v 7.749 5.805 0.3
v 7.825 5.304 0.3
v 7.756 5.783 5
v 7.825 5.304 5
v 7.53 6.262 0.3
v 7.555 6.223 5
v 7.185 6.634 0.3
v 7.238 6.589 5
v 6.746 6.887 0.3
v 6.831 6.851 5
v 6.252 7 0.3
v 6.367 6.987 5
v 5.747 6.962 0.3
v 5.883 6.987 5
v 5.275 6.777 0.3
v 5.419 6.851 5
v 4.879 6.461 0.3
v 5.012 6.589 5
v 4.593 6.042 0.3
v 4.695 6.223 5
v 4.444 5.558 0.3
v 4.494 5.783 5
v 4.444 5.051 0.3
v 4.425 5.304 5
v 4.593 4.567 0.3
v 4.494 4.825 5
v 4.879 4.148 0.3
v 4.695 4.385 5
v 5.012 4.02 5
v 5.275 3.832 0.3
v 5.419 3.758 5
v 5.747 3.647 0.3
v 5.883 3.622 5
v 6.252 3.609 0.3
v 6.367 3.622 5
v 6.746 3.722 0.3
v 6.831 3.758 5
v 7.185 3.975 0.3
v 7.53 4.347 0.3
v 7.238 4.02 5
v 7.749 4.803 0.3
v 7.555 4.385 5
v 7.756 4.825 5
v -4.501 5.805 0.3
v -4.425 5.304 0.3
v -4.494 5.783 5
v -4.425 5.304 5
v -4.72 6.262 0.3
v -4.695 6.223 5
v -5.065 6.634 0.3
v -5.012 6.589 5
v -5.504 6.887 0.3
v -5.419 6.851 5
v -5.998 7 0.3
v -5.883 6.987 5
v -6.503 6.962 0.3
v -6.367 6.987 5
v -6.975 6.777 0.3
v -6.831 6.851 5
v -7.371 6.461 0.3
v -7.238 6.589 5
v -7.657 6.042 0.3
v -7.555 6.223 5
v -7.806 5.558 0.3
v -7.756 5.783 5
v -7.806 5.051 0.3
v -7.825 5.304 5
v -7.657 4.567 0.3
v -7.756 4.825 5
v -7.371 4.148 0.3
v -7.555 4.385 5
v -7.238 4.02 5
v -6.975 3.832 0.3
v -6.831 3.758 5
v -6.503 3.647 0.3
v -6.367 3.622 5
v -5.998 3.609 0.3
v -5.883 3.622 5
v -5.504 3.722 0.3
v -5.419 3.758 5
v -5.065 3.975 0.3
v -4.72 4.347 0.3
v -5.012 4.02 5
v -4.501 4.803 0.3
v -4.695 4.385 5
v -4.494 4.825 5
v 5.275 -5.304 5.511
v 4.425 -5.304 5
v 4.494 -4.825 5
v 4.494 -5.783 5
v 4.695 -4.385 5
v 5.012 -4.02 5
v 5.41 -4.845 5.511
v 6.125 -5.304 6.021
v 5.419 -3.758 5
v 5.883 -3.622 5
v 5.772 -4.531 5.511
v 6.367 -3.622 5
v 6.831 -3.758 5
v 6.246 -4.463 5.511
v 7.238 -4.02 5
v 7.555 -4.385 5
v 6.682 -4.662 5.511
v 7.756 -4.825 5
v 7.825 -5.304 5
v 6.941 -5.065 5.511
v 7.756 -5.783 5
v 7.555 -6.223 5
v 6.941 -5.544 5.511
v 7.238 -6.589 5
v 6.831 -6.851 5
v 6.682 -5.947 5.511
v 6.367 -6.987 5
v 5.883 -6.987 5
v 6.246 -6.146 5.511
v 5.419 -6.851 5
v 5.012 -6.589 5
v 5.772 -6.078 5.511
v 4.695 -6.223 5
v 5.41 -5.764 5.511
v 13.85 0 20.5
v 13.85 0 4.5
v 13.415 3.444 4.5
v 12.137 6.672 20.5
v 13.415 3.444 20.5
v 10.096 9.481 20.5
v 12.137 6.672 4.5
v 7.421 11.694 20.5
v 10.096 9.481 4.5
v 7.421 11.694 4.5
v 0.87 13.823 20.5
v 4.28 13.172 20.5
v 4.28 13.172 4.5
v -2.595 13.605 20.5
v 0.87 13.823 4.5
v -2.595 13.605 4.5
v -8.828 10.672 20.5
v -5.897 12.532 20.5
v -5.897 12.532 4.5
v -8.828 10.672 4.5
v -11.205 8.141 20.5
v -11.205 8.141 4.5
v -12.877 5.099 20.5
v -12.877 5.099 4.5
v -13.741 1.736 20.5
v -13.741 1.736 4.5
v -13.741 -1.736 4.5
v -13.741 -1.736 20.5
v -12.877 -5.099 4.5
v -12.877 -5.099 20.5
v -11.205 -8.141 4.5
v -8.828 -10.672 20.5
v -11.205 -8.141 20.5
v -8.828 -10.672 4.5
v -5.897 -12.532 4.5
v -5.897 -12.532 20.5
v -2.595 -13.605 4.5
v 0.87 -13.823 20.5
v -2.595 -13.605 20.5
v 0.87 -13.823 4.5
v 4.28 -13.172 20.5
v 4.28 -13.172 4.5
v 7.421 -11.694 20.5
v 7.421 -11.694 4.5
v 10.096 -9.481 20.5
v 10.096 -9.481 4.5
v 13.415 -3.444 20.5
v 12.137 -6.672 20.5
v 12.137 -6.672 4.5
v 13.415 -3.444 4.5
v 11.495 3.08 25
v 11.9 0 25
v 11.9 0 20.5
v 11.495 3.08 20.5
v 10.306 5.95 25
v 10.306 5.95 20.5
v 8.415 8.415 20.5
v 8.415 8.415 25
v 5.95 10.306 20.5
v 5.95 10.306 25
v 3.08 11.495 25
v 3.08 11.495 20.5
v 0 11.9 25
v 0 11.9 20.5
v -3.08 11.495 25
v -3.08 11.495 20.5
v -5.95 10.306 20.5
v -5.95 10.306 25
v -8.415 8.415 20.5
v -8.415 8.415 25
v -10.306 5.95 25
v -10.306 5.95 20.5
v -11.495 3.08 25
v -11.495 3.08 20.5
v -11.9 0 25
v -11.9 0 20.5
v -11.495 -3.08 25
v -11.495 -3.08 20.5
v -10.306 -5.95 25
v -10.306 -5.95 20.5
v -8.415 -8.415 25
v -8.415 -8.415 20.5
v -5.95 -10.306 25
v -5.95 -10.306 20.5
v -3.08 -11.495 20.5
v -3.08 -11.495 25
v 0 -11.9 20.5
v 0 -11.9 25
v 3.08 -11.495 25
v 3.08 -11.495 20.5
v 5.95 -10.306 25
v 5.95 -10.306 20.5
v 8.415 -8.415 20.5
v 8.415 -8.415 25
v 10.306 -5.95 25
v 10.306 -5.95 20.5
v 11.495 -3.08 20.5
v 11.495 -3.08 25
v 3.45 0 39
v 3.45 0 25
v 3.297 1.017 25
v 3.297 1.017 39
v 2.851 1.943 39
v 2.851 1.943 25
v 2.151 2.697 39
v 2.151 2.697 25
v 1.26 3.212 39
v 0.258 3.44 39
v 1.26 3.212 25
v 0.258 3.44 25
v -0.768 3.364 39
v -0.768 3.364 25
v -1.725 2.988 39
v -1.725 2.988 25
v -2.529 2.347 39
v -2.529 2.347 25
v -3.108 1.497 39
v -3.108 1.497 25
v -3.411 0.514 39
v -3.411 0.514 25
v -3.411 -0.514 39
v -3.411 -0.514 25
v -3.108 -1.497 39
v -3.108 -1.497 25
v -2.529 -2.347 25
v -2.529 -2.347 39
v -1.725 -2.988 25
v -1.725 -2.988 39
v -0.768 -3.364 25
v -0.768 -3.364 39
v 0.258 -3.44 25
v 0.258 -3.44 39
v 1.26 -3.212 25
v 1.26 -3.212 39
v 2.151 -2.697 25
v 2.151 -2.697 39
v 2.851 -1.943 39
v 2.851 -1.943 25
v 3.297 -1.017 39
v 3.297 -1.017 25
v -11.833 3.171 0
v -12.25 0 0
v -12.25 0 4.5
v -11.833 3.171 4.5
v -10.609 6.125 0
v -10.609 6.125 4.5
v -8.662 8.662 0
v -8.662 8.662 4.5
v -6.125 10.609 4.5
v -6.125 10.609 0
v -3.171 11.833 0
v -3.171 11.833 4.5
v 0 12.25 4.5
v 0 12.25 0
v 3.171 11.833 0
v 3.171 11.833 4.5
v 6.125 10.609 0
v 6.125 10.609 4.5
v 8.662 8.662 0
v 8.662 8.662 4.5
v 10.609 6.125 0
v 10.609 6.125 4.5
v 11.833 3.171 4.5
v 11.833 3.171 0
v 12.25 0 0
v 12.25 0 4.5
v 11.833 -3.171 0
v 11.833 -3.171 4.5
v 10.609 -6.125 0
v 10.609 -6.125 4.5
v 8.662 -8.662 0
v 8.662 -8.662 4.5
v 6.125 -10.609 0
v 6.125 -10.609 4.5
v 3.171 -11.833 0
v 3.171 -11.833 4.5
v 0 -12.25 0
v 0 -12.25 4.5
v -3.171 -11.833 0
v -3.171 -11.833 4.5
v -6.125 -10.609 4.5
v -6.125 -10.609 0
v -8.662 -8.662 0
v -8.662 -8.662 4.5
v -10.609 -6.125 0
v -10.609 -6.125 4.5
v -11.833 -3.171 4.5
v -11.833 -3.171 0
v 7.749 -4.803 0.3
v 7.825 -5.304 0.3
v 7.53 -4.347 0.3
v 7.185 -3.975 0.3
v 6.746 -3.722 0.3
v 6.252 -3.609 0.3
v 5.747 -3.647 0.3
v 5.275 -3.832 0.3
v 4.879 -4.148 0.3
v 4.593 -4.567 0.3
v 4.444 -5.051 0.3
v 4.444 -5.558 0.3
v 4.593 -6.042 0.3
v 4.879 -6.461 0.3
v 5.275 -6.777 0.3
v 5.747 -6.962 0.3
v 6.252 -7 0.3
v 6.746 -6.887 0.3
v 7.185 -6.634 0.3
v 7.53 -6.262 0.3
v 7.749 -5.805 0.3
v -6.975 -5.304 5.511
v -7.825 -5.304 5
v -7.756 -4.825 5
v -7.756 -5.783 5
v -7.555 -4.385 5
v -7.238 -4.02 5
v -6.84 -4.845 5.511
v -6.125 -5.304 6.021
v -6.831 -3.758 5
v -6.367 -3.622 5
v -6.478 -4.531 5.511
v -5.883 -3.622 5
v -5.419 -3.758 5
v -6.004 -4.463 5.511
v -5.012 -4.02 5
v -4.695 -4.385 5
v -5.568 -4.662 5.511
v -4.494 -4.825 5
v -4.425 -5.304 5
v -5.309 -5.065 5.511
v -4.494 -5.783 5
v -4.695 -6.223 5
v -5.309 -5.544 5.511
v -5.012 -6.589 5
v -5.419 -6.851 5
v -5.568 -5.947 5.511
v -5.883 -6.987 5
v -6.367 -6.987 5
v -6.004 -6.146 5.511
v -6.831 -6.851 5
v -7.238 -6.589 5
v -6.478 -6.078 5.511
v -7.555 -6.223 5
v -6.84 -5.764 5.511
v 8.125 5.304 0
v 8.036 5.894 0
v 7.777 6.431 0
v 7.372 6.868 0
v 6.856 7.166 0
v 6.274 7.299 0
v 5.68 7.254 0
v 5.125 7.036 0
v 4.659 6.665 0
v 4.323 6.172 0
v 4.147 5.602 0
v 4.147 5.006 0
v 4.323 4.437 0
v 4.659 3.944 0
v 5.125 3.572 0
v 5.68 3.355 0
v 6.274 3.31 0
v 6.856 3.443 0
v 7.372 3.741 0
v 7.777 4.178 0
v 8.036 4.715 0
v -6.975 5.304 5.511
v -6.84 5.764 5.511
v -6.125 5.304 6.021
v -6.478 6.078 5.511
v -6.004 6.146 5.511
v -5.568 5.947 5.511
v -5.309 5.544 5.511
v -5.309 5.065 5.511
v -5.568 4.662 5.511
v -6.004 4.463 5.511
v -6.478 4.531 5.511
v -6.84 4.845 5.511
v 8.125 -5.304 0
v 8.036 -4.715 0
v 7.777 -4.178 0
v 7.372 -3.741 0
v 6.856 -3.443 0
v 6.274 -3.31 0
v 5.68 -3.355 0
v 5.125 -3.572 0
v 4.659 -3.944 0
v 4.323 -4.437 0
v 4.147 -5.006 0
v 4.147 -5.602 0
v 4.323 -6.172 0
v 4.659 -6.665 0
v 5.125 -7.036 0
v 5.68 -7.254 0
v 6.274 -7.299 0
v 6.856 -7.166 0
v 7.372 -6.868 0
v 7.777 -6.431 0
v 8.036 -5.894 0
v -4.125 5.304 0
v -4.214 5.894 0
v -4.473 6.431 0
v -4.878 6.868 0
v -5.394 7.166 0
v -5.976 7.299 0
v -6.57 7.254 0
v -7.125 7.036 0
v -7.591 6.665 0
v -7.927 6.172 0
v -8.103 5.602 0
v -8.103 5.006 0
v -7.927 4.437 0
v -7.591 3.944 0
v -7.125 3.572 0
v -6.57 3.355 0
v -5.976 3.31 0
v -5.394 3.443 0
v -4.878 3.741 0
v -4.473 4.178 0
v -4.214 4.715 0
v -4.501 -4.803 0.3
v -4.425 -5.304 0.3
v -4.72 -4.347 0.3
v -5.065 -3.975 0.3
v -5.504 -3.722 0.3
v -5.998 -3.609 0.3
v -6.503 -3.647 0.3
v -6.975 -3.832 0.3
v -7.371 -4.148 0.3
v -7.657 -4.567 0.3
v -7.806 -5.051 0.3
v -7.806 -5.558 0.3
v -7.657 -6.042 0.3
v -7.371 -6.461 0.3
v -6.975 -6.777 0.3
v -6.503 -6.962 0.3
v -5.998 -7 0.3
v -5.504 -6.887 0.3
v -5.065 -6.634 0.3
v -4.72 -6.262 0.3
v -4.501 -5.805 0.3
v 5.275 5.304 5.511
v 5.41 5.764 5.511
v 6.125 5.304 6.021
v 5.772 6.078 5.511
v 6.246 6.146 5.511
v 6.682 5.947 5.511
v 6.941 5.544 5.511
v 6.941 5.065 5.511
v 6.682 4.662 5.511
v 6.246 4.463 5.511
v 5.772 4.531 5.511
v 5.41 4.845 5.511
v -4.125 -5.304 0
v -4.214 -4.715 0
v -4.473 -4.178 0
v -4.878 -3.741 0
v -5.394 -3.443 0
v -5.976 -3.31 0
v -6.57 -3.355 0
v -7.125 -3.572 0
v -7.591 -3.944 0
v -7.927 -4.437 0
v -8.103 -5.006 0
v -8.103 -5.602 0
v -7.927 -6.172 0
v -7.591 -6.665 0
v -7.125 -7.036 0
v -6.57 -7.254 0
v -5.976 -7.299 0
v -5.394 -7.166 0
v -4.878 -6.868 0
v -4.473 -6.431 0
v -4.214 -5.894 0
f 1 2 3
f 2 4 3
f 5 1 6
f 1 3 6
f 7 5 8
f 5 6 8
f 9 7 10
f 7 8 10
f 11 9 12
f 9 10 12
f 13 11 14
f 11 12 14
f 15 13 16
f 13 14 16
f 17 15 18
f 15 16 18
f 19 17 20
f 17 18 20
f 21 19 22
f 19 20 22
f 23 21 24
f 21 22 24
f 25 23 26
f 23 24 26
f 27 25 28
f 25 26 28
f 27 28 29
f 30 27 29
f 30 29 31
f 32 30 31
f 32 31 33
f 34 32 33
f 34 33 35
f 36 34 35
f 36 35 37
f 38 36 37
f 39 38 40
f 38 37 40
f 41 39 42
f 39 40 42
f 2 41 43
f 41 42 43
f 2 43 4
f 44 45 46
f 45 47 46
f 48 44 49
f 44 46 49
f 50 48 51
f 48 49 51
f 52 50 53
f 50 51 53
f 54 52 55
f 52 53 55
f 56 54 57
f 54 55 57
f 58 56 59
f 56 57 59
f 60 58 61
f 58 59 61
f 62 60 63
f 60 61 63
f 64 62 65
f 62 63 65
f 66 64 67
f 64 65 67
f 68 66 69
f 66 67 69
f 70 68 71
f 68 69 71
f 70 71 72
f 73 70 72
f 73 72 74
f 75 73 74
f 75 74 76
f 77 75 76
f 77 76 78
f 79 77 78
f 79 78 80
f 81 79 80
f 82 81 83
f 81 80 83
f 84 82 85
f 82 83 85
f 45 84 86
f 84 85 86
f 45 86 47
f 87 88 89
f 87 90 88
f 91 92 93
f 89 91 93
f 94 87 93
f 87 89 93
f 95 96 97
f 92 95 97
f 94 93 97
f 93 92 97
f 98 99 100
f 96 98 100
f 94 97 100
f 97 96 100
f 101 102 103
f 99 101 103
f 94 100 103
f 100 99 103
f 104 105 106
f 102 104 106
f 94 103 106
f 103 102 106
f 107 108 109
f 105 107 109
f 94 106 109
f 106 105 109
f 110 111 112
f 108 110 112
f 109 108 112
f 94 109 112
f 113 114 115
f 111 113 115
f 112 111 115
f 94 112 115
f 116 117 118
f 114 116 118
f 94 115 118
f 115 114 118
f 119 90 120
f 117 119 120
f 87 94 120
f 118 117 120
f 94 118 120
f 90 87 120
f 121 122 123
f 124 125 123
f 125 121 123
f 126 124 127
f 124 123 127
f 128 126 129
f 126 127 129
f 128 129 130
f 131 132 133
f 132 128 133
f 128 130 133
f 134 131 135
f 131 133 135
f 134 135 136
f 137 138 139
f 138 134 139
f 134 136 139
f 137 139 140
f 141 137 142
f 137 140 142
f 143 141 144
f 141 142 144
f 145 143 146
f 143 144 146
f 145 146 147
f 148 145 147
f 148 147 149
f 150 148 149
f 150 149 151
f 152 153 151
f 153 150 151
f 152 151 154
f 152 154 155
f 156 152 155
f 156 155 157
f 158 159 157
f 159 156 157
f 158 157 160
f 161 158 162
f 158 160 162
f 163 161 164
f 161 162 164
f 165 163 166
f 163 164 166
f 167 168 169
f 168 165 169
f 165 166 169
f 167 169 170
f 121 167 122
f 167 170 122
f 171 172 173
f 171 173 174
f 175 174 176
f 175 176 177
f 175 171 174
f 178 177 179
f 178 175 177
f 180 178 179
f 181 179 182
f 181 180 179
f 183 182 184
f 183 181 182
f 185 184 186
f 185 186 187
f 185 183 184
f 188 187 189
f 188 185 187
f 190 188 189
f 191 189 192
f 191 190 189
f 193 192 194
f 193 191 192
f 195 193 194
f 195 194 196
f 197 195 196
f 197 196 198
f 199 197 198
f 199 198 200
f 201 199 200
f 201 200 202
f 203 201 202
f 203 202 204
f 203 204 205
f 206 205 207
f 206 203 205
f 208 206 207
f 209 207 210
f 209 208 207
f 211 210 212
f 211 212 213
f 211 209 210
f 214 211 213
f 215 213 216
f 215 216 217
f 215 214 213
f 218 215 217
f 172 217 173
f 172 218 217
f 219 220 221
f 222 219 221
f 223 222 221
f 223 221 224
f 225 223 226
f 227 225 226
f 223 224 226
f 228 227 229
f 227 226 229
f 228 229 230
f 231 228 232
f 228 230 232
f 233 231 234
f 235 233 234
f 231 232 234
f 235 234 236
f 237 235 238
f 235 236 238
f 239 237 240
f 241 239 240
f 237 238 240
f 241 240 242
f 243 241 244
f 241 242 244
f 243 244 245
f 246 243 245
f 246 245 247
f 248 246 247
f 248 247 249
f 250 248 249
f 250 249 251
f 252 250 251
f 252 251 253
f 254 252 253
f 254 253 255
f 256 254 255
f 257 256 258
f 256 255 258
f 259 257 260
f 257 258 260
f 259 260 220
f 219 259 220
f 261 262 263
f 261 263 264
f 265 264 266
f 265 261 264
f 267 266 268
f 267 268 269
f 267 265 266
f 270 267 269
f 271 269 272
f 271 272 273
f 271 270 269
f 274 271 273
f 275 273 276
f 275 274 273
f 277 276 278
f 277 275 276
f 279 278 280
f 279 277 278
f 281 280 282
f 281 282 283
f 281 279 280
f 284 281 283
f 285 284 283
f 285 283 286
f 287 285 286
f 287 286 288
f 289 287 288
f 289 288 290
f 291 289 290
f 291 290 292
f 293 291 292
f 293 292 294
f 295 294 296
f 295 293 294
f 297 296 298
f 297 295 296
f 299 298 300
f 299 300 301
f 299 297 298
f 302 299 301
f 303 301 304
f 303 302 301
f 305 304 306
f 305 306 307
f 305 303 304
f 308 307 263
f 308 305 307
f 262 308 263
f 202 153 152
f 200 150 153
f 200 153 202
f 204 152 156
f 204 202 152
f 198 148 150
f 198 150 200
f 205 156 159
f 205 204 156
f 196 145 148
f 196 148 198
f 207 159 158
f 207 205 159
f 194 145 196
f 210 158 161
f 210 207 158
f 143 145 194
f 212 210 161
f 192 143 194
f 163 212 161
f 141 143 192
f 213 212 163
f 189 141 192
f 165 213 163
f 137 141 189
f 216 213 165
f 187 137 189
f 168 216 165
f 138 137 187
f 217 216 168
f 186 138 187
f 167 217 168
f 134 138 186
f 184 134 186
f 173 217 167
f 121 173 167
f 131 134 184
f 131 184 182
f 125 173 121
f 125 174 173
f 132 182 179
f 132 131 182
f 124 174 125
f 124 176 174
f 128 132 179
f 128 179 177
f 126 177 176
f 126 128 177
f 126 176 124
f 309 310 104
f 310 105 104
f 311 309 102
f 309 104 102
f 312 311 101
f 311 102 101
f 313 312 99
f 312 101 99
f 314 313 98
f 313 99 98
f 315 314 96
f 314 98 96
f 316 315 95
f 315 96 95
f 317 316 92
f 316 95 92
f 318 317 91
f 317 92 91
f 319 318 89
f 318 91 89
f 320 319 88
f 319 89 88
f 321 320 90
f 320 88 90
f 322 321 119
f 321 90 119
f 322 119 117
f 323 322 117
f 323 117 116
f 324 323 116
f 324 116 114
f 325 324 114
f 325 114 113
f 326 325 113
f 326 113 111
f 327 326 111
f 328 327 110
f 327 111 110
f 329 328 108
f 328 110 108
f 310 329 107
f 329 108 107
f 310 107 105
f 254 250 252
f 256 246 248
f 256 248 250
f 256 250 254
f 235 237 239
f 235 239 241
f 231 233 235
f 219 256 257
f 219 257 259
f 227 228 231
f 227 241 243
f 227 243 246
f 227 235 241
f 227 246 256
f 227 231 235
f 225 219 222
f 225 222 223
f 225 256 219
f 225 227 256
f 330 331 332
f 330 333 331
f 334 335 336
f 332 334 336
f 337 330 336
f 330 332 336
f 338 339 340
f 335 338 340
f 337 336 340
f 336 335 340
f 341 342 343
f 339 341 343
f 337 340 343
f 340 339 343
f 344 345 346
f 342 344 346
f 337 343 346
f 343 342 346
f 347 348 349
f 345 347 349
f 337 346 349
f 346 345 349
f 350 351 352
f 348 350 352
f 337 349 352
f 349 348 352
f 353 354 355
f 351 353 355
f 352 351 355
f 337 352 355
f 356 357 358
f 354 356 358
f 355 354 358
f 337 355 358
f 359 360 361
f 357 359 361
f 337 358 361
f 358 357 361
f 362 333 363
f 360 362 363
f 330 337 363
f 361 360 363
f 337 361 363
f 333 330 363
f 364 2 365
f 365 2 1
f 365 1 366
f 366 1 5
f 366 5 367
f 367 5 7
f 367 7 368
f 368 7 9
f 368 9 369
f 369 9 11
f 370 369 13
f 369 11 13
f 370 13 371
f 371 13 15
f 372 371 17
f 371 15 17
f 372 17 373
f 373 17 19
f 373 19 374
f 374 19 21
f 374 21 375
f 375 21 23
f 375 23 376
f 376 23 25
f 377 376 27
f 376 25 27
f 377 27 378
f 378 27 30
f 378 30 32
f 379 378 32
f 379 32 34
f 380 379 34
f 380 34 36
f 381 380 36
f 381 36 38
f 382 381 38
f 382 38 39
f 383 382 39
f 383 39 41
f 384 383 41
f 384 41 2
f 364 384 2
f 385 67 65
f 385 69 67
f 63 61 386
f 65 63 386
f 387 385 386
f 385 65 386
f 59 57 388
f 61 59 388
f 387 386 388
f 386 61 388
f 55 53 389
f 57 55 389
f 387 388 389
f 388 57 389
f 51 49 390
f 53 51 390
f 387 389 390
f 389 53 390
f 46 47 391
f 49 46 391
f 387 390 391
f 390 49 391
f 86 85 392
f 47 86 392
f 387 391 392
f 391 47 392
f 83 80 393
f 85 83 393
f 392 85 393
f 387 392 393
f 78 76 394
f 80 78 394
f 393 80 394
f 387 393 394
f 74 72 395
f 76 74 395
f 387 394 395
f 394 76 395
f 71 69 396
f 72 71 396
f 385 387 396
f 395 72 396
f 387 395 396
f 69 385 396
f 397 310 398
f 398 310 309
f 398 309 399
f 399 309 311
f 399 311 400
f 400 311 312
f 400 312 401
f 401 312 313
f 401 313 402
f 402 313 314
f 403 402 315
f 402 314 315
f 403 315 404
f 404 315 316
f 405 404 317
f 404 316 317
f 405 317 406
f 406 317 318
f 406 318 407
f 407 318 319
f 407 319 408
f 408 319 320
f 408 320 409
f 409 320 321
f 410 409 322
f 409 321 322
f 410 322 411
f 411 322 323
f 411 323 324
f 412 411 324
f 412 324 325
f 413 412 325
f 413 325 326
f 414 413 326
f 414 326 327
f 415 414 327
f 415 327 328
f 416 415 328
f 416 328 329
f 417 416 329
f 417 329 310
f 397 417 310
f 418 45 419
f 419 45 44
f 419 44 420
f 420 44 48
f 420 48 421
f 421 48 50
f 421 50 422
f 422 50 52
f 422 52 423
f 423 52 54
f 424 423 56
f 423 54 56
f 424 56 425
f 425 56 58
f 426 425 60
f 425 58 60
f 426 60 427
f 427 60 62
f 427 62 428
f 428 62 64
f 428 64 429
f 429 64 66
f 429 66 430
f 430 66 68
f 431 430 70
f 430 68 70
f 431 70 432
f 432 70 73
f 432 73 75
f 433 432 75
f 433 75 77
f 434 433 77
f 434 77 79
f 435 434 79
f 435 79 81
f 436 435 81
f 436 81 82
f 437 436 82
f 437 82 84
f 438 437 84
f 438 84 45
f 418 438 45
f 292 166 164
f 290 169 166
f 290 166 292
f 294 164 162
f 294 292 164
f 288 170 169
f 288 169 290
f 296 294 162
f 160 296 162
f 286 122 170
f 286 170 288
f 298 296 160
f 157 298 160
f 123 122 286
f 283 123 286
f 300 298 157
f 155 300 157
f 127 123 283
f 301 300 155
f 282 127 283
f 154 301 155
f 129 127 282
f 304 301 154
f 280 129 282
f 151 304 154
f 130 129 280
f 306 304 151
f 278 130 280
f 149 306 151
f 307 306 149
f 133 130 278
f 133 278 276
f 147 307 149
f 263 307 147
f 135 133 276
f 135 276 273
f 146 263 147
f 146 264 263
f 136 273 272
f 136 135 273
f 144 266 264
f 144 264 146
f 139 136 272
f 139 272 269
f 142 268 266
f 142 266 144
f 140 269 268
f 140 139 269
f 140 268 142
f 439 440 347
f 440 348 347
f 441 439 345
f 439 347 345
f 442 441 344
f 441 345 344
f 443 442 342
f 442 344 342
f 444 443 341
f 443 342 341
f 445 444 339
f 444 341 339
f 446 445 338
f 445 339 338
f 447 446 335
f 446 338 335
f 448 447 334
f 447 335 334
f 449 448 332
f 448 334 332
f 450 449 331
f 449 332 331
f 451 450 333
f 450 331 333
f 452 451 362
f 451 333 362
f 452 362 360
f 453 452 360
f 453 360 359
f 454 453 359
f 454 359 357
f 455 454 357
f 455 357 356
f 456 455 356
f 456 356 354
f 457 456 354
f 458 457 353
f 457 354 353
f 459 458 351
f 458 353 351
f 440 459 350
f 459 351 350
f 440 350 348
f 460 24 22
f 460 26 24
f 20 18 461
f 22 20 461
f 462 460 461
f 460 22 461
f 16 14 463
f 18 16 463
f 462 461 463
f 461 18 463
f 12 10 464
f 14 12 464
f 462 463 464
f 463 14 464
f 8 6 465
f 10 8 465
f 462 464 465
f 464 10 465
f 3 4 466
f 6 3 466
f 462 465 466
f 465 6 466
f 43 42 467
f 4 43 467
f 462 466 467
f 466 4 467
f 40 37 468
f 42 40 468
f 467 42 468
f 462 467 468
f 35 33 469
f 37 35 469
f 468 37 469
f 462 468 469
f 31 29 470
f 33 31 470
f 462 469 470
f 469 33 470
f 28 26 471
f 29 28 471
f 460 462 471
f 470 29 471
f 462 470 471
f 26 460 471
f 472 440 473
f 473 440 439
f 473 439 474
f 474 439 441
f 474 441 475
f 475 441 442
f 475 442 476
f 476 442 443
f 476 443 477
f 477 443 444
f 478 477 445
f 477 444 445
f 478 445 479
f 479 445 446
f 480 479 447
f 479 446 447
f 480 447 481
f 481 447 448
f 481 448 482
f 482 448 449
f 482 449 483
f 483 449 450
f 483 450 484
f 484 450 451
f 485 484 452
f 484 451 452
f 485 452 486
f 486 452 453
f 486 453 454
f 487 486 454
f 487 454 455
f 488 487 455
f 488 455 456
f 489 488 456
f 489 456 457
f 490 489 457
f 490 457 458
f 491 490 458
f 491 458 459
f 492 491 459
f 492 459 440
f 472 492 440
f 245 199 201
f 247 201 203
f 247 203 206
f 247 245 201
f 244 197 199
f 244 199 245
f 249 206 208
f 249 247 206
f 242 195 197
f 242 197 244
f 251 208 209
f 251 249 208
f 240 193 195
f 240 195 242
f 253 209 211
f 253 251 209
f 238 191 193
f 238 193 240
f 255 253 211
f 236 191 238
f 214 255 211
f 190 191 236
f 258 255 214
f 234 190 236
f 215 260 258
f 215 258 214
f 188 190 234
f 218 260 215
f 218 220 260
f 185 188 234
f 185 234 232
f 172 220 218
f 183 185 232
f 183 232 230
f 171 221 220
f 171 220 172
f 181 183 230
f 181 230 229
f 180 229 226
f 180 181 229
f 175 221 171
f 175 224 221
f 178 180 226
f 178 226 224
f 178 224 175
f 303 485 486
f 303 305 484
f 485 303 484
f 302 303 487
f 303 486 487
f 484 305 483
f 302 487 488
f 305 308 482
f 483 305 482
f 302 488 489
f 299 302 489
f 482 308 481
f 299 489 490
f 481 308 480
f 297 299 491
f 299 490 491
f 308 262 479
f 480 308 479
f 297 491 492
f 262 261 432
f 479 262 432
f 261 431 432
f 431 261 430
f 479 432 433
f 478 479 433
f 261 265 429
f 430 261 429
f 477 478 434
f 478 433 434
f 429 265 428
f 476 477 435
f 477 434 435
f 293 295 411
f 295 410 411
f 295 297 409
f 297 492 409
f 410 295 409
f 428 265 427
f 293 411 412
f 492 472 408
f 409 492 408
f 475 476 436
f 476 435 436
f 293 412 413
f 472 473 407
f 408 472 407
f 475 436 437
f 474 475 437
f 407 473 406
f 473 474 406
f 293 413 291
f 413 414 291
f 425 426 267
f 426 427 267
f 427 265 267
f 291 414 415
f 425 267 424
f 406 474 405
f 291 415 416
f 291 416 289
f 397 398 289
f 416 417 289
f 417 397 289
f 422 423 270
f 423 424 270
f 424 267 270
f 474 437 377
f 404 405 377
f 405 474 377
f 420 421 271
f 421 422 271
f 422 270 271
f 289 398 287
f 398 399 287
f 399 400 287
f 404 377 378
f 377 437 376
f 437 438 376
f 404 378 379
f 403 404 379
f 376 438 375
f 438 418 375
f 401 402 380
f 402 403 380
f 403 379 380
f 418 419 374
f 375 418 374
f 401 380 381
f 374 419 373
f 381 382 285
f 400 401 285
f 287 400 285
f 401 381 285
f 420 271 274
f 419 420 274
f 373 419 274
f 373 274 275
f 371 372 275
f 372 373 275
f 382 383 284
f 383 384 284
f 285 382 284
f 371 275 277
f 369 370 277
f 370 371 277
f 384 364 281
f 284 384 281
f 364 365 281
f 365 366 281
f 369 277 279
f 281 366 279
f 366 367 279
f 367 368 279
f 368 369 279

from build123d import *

# Parameters (mm, degrees)
SKETCH1_R                                       = 13.85
BOSS_EXTRUDE1_DEPTH                             = 25
SKETCH2_OUTSIDE_W                               = 38.994
SKETCH2_OUTSIDE_H                               = 38.994
SKETCH2_OUTSIDE_R                               = 11.9
CUT_EXTRUDE3_DEPTH                              = 4.5
SKETCH6_OUTSIDE_W                               = 38.994
SKETCH6_OUTSIDE_H                               = 38.994
SKETCH6_OUTSIDE_R                               = 12.25
CUT_EXTRUDE5_DEPTH                              = 4.5
SKETCH7_R                                       = 3.45
BOSS_EXTRUDE2_DEPTH                             = 14
CSK_FOR_M3_OVAL_HEAD_MACHINE_SCREW2_D           = 3.4
CSK_FOR_M3_OVAL_HEAD_MACHINE_SCREW2_DEPTH       = 5
CSK_FOR_M3_OVAL_HEAD_MACHINE_SCREW2_CSINK_D     = 4
CSK_FOR_M3_OVAL_HEAD_MACHINE_SCREW2_CSINK_ANGLE = 90
CSK_FOR_M3_OVAL_HEAD_MACHINE_SCREW2_TIP         = 1.021463052


with BuildPart() as part:
    # Sketch1 → Boss-Extrude1 (new body)
    with BuildSketch(Plane.XY):
        Circle(SKETCH1_R)
    extrude(amount=BOSS_EXTRUDE1_DEPTH)

    # Sketch2 outside → Cut-Extrude3 (cut)
    with BuildSketch(Plane.XY.offset(25)):
        Rectangle(SKETCH2_OUTSIDE_W, SKETCH2_OUTSIDE_H)
        Circle(SKETCH2_OUTSIDE_R, mode=Mode.SUBTRACT)
    extrude(amount=-CUT_EXTRUDE3_DEPTH, mode=Mode.SUBTRACT)

    # Sketch6 outside → Cut-Extrude5 (cut)
    with BuildSketch(Plane(origin=(0, 0, 0), x_dir=(-1, 0, 0), z_dir=(0, 0, -1))):
        Rectangle(SKETCH6_OUTSIDE_W, SKETCH6_OUTSIDE_H)
        Circle(SKETCH6_OUTSIDE_R, mode=Mode.SUBTRACT)
    extrude(amount=-CUT_EXTRUDE5_DEPTH, mode=Mode.SUBTRACT)

    # Sketch7 → Boss-Extrude2 (add)
    with BuildSketch(Plane.XY.offset(25)):
        Circle(SKETCH7_R)
    extrude(amount=BOSS_EXTRUDE2_DEPTH)

    # CSK for M3 Oval Head Machine Screw2
    with Locations(Plane(origin=(0, 0, 0), x_dir=(-1, 0, 0), z_dir=(0, 0, -1))):
        with Locations((-6.125, 5.304405598), (6.125, 5.304405598), (6.125, -5.304405598), (-6.125, -5.304405598)):
            CounterSinkHole(CSK_FOR_M3_OVAL_HEAD_MACHINE_SCREW2_D / 2, CSK_FOR_M3_OVAL_HEAD_MACHINE_SCREW2_CSINK_D / 2, depth=CSK_FOR_M3_OVAL_HEAD_MACHINE_SCREW2_DEPTH, counter_sink_angle=CSK_FOR_M3_OVAL_HEAD_MACHINE_SCREW2_CSINK_ANGLE)
            with Locations((0, 0, -(CSK_FOR_M3_OVAL_HEAD_MACHINE_SCREW2_DEPTH + CSK_FOR_M3_OVAL_HEAD_MACHINE_SCREW2_TIP / 2))):  # 118° drill point
                Cone(0, CSK_FOR_M3_OVAL_HEAD_MACHINE_SCREW2_D / 2, CSK_FOR_M3_OVAL_HEAD_MACHINE_SCREW2_TIP, mode=Mode.SUBTRACT)


solid = part.part
